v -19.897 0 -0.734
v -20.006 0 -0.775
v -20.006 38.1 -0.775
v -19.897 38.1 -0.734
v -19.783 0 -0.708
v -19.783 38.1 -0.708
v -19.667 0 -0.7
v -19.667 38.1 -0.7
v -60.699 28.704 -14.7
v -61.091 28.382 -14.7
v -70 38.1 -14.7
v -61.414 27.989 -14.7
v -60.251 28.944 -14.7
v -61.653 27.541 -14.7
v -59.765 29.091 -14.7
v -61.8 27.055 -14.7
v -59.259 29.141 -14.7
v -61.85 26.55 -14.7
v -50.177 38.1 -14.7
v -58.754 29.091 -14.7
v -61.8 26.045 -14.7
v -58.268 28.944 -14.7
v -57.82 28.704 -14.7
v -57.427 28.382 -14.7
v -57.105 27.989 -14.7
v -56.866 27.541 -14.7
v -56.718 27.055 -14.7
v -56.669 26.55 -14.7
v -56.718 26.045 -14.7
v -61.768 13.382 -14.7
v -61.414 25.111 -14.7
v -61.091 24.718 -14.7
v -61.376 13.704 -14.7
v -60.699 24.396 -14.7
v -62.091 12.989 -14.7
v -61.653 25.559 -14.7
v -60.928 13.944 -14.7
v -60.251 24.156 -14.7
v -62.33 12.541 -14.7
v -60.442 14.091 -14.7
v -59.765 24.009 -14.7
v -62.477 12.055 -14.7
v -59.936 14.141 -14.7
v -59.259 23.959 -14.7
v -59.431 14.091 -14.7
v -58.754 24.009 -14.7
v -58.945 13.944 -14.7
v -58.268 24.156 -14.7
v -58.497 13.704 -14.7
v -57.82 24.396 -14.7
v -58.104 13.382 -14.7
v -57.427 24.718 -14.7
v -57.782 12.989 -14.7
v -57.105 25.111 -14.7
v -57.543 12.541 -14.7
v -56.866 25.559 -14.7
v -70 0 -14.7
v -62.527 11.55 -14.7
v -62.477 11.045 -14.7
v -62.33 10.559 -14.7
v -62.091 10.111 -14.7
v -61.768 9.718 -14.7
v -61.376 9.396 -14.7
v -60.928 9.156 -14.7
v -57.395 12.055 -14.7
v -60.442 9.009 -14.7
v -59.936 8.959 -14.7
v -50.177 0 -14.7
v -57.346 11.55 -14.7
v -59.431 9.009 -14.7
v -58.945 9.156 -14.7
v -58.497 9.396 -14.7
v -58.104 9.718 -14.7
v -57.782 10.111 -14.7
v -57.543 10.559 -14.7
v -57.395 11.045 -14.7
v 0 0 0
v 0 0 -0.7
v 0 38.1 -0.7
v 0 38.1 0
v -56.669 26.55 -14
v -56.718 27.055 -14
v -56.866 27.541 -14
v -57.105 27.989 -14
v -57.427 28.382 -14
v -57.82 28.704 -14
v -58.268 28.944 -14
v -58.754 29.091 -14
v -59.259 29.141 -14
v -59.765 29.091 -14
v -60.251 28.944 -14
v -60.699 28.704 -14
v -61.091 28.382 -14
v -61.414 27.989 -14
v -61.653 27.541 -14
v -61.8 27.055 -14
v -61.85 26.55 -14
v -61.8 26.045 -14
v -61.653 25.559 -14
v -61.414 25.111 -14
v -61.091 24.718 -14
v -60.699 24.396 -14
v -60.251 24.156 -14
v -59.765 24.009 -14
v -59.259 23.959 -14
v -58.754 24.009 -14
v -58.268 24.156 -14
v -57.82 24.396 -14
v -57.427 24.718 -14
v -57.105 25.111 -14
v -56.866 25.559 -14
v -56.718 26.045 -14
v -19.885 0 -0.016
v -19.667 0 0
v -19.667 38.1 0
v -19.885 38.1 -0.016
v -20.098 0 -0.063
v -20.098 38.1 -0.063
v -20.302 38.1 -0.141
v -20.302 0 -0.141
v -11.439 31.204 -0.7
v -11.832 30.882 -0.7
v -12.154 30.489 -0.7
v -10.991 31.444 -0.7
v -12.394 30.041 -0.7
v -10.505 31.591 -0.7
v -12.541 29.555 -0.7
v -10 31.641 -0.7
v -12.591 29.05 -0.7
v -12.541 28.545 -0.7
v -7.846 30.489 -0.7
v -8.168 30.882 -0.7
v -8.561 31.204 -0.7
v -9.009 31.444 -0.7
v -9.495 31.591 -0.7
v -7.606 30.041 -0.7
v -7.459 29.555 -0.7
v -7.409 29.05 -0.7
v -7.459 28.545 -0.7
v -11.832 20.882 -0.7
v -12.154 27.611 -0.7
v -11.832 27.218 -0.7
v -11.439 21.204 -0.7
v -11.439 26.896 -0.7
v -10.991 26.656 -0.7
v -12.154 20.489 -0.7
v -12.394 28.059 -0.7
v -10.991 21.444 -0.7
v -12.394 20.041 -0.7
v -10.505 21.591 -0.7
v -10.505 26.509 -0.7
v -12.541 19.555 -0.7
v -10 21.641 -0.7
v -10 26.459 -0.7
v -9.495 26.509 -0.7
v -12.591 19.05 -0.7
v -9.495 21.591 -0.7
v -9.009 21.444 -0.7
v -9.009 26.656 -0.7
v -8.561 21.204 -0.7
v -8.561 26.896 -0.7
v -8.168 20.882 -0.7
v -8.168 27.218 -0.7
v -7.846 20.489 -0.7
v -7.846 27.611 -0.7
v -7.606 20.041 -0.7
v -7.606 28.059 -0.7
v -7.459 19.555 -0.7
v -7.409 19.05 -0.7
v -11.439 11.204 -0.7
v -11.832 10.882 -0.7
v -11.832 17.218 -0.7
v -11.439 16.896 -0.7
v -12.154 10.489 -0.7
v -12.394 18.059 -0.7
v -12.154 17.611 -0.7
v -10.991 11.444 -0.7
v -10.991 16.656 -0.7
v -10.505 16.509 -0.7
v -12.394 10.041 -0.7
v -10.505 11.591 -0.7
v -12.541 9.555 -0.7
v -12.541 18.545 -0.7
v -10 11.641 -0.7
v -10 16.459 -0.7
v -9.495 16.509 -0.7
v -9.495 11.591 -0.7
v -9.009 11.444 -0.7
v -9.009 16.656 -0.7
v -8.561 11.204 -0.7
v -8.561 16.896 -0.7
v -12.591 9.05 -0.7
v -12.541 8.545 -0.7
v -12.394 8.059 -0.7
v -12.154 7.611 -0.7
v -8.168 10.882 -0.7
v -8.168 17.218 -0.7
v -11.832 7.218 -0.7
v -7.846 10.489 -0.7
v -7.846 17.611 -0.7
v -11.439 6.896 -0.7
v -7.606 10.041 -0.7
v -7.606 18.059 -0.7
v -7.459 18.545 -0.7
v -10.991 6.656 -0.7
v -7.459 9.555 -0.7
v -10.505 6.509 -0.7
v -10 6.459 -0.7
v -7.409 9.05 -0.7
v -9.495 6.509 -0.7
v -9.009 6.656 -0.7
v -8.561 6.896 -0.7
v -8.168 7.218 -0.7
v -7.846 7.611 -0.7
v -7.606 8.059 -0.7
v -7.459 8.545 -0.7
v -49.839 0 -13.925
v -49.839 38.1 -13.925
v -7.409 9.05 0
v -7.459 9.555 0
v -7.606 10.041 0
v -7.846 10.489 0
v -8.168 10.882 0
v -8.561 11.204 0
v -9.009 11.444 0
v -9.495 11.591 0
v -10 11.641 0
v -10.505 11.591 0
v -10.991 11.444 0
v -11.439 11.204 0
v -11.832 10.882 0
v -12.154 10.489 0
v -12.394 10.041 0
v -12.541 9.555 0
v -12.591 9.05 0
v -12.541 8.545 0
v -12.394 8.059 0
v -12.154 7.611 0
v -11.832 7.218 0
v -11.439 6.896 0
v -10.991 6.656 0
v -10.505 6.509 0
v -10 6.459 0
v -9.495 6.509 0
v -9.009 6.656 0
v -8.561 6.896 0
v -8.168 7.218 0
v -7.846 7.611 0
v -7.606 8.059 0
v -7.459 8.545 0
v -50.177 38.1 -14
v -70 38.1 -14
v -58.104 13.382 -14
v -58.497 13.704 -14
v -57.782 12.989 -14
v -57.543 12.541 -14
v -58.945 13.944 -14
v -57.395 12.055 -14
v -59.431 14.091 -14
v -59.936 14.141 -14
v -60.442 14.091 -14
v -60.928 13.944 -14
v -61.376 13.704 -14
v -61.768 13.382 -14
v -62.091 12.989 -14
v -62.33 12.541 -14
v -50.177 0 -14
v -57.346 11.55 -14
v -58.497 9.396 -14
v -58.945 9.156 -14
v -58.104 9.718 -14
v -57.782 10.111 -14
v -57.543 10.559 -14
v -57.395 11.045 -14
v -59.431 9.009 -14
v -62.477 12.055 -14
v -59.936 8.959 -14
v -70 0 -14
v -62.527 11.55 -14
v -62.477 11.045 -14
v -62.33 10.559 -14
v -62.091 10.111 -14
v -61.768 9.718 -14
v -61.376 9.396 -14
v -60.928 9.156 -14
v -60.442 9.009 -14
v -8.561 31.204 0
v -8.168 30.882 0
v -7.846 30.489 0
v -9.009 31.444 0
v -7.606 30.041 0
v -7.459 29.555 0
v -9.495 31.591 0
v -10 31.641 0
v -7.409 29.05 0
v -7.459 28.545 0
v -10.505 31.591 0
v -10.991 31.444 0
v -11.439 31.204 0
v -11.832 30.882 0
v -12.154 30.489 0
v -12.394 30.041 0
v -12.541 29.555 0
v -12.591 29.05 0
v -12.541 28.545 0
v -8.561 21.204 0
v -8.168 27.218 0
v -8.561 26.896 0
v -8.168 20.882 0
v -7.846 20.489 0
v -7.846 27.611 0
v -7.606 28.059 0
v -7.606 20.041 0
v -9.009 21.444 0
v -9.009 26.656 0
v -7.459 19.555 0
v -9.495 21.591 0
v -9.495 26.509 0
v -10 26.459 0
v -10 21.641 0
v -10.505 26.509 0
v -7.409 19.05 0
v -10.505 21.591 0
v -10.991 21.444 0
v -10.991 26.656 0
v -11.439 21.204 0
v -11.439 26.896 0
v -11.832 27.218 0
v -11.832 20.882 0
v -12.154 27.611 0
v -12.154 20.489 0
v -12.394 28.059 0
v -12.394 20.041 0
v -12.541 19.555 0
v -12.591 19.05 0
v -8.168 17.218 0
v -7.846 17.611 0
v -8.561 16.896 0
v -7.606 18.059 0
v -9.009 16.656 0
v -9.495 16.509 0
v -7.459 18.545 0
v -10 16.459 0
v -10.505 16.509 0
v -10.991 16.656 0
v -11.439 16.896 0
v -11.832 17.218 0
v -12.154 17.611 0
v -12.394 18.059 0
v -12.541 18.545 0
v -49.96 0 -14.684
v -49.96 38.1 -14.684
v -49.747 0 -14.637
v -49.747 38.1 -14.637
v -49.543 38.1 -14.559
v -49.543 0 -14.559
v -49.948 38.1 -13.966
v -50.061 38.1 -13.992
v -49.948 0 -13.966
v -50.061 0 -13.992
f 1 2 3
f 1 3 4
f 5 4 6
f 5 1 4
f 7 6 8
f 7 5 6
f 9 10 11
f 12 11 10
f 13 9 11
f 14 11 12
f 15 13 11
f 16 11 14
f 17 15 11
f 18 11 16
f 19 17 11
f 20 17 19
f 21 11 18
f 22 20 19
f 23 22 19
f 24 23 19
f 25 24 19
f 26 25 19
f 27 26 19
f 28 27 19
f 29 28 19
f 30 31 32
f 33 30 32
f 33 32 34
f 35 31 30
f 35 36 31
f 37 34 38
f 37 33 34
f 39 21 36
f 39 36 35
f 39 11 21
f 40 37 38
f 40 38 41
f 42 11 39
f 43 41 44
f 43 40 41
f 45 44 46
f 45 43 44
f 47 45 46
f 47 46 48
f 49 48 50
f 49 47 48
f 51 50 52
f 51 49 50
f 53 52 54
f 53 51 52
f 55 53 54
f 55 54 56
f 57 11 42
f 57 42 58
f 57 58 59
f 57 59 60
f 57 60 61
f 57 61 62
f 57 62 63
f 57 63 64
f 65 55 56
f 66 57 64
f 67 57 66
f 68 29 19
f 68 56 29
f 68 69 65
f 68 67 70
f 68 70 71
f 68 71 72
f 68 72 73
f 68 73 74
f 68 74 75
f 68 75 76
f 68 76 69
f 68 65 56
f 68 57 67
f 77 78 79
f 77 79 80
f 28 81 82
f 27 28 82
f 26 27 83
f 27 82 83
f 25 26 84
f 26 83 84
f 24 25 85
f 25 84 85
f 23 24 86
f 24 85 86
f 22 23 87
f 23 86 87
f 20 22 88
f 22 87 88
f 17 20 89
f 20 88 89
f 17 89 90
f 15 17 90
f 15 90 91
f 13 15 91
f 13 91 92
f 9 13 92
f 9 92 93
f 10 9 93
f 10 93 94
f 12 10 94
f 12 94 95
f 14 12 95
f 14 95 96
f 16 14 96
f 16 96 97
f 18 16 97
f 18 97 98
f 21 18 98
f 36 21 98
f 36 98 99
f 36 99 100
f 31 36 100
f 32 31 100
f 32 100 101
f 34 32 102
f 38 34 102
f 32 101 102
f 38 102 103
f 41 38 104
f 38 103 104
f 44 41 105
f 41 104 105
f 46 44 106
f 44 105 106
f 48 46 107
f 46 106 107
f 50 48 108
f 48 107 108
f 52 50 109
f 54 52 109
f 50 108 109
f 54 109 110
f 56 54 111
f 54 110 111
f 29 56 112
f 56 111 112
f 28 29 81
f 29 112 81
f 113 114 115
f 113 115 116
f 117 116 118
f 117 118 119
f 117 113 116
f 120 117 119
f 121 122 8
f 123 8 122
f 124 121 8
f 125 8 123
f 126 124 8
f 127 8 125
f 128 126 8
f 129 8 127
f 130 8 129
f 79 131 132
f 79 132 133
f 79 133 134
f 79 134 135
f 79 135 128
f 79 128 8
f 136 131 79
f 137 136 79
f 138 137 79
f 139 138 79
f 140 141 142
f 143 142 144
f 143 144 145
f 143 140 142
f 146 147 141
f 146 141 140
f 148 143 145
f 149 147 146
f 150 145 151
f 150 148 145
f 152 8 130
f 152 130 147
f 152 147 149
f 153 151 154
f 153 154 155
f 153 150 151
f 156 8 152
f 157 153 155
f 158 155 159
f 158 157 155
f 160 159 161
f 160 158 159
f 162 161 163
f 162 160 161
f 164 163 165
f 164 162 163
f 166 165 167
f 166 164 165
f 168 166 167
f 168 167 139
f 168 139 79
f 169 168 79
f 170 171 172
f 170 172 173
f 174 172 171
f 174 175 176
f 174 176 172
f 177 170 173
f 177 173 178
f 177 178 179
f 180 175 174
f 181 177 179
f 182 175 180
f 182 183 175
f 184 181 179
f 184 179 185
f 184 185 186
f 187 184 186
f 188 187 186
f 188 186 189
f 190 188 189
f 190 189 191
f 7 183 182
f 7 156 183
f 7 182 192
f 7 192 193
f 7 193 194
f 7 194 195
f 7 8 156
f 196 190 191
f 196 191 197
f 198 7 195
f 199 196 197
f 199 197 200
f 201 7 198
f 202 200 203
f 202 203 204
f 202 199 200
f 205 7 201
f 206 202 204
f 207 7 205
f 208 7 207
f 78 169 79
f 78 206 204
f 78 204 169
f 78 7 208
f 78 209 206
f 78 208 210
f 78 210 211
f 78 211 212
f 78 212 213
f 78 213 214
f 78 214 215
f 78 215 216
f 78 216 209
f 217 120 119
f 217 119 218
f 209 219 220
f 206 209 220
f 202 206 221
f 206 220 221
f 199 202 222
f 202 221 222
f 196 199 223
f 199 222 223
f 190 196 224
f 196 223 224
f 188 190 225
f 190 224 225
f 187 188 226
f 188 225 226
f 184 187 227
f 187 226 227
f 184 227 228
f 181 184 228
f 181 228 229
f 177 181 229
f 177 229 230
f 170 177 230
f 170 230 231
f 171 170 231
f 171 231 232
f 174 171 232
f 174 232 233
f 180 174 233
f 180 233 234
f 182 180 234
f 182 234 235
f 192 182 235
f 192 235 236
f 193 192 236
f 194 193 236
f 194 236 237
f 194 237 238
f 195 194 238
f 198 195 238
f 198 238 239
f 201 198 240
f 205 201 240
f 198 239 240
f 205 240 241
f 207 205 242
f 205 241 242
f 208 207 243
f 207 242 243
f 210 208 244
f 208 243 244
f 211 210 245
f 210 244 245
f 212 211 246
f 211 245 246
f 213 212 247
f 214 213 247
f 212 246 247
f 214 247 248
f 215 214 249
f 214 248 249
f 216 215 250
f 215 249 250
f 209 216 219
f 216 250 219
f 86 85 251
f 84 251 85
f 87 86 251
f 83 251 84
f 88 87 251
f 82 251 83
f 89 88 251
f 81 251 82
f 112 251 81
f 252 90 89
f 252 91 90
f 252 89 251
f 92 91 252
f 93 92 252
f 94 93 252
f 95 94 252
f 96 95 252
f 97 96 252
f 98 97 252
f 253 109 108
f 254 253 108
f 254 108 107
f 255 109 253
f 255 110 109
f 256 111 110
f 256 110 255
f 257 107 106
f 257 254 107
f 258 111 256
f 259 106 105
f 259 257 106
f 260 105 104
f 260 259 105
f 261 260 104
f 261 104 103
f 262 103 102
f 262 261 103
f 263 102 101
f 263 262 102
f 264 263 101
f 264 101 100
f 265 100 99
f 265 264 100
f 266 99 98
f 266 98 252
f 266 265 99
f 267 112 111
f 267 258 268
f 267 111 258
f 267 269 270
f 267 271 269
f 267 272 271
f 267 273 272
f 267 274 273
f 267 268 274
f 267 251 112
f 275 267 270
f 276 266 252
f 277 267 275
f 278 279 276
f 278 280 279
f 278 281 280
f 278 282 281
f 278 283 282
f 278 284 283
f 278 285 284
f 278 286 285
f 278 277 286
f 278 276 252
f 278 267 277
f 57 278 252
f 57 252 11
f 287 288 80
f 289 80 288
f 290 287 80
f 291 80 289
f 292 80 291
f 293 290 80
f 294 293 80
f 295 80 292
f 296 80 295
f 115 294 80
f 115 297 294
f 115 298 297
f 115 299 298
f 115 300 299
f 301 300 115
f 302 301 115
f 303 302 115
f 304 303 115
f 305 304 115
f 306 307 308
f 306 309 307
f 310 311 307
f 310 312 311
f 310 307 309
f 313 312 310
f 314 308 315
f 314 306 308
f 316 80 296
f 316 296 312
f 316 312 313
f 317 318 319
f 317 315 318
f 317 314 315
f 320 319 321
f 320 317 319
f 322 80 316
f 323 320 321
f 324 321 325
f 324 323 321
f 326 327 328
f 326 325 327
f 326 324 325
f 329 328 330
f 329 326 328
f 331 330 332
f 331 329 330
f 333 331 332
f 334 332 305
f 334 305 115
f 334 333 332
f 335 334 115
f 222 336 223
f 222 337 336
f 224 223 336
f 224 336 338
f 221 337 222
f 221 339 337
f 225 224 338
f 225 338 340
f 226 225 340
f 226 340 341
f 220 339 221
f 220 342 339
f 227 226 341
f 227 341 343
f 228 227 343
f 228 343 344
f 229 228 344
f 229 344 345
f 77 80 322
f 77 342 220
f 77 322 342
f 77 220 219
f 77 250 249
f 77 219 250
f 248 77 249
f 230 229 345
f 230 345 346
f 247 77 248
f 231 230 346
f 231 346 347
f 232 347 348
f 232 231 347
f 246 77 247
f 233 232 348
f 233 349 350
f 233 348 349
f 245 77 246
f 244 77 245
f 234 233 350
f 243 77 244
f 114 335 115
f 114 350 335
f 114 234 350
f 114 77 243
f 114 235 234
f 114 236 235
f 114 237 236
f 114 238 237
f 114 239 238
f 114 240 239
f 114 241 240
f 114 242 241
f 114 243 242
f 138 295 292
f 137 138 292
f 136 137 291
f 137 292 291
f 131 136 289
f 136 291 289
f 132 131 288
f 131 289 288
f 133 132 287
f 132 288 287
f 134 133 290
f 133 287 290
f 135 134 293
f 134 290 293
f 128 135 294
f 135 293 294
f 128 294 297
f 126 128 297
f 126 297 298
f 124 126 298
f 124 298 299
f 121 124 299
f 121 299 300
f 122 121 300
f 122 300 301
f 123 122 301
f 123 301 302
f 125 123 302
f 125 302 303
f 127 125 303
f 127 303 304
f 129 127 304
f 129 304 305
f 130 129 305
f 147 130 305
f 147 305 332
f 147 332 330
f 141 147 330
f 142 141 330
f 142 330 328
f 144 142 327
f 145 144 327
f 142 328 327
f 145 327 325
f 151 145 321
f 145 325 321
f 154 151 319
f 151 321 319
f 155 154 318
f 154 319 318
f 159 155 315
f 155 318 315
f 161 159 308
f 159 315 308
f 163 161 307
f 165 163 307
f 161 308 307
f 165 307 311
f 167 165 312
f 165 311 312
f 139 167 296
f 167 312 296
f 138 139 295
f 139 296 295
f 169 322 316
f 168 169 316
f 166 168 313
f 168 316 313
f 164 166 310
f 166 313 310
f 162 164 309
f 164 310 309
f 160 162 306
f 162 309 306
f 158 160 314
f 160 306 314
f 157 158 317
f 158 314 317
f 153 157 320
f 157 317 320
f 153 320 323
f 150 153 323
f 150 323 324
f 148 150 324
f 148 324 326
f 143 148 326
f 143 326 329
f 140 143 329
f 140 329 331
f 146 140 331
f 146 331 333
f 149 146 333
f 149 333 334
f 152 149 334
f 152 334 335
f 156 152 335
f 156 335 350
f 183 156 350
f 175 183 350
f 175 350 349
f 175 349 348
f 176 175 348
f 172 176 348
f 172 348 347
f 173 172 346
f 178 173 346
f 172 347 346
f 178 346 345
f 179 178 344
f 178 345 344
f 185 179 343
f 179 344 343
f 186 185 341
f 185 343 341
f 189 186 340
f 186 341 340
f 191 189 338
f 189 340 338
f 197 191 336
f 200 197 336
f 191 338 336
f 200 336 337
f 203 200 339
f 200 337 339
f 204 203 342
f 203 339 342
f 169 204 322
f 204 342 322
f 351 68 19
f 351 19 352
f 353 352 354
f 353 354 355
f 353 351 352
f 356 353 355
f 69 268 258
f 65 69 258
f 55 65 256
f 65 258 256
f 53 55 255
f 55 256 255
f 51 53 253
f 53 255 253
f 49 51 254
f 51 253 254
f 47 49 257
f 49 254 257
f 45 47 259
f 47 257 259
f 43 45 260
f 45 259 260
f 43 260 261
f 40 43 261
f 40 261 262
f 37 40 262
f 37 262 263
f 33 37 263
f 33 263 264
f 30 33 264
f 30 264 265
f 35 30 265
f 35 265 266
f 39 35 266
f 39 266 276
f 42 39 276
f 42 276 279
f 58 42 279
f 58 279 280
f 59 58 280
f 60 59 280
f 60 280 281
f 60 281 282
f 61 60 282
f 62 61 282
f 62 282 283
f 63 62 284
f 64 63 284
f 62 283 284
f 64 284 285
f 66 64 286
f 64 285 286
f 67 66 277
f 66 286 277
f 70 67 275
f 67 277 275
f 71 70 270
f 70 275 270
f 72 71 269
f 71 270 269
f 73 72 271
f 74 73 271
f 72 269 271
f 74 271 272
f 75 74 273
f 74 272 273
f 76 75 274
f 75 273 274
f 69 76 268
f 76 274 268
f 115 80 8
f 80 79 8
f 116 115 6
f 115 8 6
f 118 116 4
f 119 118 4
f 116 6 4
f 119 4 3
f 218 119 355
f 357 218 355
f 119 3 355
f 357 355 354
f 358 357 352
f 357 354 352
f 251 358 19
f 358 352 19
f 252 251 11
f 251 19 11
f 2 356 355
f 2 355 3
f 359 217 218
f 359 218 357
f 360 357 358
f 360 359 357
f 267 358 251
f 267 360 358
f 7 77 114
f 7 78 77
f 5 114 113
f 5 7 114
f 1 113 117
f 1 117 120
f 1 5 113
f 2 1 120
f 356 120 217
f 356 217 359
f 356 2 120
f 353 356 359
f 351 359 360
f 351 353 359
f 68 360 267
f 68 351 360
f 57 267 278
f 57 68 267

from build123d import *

# Parameters (mm, degrees)
BASE_FLANGE1_DEPTH         = 38.1
F_6_0_204_DIAMETER_HOLE1_D = 5.1816
F_6_0_204_DIAMETER_HOLE2_D = 5.1816


# Sheet-metal steps are written as plain solids
with BuildPart() as part:
    # Sketch1 → Base-Flange1 (new body)
    with BuildSketch(Plane(origin=(0, 0, 0), x_dir=(1, 0, 0), z_dir=(0, 1, 0))):
        with BuildLine():
            Line((0, 0), (-19.667225995, 0))
            ThreePointArc((-19.667225995, 0), (-19.992101306, 0.035603868), (-20.301554193, 0.14072529))
            Line((-20.301554193, 0.14072529), (-49.839171097, 13.924946512))
            ThreePointArc((-49.839171097, 13.924946512), (-50.004212637, 13.981011271), (-50.177479469, 14))
            Line((-50.177479469, 14), (-70, 14))
            Line((-70, 14), (-70, 14.7))
            Line((-70, 14.7), (-50.177479469, 14.7))
            ThreePointArc((-50.177479469, 14.7), (-49.852604159, 14.664396132), (-49.543151271, 14.55927471))
            Line((-49.543151271, 14.55927471), (-20.005534367, 0.775053488))
            ThreePointArc((-20.005534367, 0.775053488), (-19.840492827, 0.718988729), (-19.667225995, 0.7))
            Line((-19.667225995, 0.7), (0, 0.7))
            Line((0, 0.7), (0, 0))
        make_face()
    extrude(amount=BASE_FLANGE1_DEPTH)

    # #6 (0.204) Diameter Hole1 (through all)
    with Locations(Plane(origin=(0, 0, -0.7), x_dir=(-1, 0, 0), z_dir=(0, 0, -1))):
        with Locations((10, 29.05), (10, 19.05), (10, 9.05)):
            Hole(F_6_0_204_DIAMETER_HOLE1_D / 2)

    # #6 (0.204) Diameter Hole2 (through all)
    with Locations(Plane(origin=(0, 0, -14.7), x_dir=(-1, 0, 0), z_dir=(0, 0, -1))):
        with Locations((59.259333943, 26.55), (59.936433657, 11.55)):
            Hole(F_6_0_204_DIAMETER_HOLE2_D / 2)


solid = part.part
